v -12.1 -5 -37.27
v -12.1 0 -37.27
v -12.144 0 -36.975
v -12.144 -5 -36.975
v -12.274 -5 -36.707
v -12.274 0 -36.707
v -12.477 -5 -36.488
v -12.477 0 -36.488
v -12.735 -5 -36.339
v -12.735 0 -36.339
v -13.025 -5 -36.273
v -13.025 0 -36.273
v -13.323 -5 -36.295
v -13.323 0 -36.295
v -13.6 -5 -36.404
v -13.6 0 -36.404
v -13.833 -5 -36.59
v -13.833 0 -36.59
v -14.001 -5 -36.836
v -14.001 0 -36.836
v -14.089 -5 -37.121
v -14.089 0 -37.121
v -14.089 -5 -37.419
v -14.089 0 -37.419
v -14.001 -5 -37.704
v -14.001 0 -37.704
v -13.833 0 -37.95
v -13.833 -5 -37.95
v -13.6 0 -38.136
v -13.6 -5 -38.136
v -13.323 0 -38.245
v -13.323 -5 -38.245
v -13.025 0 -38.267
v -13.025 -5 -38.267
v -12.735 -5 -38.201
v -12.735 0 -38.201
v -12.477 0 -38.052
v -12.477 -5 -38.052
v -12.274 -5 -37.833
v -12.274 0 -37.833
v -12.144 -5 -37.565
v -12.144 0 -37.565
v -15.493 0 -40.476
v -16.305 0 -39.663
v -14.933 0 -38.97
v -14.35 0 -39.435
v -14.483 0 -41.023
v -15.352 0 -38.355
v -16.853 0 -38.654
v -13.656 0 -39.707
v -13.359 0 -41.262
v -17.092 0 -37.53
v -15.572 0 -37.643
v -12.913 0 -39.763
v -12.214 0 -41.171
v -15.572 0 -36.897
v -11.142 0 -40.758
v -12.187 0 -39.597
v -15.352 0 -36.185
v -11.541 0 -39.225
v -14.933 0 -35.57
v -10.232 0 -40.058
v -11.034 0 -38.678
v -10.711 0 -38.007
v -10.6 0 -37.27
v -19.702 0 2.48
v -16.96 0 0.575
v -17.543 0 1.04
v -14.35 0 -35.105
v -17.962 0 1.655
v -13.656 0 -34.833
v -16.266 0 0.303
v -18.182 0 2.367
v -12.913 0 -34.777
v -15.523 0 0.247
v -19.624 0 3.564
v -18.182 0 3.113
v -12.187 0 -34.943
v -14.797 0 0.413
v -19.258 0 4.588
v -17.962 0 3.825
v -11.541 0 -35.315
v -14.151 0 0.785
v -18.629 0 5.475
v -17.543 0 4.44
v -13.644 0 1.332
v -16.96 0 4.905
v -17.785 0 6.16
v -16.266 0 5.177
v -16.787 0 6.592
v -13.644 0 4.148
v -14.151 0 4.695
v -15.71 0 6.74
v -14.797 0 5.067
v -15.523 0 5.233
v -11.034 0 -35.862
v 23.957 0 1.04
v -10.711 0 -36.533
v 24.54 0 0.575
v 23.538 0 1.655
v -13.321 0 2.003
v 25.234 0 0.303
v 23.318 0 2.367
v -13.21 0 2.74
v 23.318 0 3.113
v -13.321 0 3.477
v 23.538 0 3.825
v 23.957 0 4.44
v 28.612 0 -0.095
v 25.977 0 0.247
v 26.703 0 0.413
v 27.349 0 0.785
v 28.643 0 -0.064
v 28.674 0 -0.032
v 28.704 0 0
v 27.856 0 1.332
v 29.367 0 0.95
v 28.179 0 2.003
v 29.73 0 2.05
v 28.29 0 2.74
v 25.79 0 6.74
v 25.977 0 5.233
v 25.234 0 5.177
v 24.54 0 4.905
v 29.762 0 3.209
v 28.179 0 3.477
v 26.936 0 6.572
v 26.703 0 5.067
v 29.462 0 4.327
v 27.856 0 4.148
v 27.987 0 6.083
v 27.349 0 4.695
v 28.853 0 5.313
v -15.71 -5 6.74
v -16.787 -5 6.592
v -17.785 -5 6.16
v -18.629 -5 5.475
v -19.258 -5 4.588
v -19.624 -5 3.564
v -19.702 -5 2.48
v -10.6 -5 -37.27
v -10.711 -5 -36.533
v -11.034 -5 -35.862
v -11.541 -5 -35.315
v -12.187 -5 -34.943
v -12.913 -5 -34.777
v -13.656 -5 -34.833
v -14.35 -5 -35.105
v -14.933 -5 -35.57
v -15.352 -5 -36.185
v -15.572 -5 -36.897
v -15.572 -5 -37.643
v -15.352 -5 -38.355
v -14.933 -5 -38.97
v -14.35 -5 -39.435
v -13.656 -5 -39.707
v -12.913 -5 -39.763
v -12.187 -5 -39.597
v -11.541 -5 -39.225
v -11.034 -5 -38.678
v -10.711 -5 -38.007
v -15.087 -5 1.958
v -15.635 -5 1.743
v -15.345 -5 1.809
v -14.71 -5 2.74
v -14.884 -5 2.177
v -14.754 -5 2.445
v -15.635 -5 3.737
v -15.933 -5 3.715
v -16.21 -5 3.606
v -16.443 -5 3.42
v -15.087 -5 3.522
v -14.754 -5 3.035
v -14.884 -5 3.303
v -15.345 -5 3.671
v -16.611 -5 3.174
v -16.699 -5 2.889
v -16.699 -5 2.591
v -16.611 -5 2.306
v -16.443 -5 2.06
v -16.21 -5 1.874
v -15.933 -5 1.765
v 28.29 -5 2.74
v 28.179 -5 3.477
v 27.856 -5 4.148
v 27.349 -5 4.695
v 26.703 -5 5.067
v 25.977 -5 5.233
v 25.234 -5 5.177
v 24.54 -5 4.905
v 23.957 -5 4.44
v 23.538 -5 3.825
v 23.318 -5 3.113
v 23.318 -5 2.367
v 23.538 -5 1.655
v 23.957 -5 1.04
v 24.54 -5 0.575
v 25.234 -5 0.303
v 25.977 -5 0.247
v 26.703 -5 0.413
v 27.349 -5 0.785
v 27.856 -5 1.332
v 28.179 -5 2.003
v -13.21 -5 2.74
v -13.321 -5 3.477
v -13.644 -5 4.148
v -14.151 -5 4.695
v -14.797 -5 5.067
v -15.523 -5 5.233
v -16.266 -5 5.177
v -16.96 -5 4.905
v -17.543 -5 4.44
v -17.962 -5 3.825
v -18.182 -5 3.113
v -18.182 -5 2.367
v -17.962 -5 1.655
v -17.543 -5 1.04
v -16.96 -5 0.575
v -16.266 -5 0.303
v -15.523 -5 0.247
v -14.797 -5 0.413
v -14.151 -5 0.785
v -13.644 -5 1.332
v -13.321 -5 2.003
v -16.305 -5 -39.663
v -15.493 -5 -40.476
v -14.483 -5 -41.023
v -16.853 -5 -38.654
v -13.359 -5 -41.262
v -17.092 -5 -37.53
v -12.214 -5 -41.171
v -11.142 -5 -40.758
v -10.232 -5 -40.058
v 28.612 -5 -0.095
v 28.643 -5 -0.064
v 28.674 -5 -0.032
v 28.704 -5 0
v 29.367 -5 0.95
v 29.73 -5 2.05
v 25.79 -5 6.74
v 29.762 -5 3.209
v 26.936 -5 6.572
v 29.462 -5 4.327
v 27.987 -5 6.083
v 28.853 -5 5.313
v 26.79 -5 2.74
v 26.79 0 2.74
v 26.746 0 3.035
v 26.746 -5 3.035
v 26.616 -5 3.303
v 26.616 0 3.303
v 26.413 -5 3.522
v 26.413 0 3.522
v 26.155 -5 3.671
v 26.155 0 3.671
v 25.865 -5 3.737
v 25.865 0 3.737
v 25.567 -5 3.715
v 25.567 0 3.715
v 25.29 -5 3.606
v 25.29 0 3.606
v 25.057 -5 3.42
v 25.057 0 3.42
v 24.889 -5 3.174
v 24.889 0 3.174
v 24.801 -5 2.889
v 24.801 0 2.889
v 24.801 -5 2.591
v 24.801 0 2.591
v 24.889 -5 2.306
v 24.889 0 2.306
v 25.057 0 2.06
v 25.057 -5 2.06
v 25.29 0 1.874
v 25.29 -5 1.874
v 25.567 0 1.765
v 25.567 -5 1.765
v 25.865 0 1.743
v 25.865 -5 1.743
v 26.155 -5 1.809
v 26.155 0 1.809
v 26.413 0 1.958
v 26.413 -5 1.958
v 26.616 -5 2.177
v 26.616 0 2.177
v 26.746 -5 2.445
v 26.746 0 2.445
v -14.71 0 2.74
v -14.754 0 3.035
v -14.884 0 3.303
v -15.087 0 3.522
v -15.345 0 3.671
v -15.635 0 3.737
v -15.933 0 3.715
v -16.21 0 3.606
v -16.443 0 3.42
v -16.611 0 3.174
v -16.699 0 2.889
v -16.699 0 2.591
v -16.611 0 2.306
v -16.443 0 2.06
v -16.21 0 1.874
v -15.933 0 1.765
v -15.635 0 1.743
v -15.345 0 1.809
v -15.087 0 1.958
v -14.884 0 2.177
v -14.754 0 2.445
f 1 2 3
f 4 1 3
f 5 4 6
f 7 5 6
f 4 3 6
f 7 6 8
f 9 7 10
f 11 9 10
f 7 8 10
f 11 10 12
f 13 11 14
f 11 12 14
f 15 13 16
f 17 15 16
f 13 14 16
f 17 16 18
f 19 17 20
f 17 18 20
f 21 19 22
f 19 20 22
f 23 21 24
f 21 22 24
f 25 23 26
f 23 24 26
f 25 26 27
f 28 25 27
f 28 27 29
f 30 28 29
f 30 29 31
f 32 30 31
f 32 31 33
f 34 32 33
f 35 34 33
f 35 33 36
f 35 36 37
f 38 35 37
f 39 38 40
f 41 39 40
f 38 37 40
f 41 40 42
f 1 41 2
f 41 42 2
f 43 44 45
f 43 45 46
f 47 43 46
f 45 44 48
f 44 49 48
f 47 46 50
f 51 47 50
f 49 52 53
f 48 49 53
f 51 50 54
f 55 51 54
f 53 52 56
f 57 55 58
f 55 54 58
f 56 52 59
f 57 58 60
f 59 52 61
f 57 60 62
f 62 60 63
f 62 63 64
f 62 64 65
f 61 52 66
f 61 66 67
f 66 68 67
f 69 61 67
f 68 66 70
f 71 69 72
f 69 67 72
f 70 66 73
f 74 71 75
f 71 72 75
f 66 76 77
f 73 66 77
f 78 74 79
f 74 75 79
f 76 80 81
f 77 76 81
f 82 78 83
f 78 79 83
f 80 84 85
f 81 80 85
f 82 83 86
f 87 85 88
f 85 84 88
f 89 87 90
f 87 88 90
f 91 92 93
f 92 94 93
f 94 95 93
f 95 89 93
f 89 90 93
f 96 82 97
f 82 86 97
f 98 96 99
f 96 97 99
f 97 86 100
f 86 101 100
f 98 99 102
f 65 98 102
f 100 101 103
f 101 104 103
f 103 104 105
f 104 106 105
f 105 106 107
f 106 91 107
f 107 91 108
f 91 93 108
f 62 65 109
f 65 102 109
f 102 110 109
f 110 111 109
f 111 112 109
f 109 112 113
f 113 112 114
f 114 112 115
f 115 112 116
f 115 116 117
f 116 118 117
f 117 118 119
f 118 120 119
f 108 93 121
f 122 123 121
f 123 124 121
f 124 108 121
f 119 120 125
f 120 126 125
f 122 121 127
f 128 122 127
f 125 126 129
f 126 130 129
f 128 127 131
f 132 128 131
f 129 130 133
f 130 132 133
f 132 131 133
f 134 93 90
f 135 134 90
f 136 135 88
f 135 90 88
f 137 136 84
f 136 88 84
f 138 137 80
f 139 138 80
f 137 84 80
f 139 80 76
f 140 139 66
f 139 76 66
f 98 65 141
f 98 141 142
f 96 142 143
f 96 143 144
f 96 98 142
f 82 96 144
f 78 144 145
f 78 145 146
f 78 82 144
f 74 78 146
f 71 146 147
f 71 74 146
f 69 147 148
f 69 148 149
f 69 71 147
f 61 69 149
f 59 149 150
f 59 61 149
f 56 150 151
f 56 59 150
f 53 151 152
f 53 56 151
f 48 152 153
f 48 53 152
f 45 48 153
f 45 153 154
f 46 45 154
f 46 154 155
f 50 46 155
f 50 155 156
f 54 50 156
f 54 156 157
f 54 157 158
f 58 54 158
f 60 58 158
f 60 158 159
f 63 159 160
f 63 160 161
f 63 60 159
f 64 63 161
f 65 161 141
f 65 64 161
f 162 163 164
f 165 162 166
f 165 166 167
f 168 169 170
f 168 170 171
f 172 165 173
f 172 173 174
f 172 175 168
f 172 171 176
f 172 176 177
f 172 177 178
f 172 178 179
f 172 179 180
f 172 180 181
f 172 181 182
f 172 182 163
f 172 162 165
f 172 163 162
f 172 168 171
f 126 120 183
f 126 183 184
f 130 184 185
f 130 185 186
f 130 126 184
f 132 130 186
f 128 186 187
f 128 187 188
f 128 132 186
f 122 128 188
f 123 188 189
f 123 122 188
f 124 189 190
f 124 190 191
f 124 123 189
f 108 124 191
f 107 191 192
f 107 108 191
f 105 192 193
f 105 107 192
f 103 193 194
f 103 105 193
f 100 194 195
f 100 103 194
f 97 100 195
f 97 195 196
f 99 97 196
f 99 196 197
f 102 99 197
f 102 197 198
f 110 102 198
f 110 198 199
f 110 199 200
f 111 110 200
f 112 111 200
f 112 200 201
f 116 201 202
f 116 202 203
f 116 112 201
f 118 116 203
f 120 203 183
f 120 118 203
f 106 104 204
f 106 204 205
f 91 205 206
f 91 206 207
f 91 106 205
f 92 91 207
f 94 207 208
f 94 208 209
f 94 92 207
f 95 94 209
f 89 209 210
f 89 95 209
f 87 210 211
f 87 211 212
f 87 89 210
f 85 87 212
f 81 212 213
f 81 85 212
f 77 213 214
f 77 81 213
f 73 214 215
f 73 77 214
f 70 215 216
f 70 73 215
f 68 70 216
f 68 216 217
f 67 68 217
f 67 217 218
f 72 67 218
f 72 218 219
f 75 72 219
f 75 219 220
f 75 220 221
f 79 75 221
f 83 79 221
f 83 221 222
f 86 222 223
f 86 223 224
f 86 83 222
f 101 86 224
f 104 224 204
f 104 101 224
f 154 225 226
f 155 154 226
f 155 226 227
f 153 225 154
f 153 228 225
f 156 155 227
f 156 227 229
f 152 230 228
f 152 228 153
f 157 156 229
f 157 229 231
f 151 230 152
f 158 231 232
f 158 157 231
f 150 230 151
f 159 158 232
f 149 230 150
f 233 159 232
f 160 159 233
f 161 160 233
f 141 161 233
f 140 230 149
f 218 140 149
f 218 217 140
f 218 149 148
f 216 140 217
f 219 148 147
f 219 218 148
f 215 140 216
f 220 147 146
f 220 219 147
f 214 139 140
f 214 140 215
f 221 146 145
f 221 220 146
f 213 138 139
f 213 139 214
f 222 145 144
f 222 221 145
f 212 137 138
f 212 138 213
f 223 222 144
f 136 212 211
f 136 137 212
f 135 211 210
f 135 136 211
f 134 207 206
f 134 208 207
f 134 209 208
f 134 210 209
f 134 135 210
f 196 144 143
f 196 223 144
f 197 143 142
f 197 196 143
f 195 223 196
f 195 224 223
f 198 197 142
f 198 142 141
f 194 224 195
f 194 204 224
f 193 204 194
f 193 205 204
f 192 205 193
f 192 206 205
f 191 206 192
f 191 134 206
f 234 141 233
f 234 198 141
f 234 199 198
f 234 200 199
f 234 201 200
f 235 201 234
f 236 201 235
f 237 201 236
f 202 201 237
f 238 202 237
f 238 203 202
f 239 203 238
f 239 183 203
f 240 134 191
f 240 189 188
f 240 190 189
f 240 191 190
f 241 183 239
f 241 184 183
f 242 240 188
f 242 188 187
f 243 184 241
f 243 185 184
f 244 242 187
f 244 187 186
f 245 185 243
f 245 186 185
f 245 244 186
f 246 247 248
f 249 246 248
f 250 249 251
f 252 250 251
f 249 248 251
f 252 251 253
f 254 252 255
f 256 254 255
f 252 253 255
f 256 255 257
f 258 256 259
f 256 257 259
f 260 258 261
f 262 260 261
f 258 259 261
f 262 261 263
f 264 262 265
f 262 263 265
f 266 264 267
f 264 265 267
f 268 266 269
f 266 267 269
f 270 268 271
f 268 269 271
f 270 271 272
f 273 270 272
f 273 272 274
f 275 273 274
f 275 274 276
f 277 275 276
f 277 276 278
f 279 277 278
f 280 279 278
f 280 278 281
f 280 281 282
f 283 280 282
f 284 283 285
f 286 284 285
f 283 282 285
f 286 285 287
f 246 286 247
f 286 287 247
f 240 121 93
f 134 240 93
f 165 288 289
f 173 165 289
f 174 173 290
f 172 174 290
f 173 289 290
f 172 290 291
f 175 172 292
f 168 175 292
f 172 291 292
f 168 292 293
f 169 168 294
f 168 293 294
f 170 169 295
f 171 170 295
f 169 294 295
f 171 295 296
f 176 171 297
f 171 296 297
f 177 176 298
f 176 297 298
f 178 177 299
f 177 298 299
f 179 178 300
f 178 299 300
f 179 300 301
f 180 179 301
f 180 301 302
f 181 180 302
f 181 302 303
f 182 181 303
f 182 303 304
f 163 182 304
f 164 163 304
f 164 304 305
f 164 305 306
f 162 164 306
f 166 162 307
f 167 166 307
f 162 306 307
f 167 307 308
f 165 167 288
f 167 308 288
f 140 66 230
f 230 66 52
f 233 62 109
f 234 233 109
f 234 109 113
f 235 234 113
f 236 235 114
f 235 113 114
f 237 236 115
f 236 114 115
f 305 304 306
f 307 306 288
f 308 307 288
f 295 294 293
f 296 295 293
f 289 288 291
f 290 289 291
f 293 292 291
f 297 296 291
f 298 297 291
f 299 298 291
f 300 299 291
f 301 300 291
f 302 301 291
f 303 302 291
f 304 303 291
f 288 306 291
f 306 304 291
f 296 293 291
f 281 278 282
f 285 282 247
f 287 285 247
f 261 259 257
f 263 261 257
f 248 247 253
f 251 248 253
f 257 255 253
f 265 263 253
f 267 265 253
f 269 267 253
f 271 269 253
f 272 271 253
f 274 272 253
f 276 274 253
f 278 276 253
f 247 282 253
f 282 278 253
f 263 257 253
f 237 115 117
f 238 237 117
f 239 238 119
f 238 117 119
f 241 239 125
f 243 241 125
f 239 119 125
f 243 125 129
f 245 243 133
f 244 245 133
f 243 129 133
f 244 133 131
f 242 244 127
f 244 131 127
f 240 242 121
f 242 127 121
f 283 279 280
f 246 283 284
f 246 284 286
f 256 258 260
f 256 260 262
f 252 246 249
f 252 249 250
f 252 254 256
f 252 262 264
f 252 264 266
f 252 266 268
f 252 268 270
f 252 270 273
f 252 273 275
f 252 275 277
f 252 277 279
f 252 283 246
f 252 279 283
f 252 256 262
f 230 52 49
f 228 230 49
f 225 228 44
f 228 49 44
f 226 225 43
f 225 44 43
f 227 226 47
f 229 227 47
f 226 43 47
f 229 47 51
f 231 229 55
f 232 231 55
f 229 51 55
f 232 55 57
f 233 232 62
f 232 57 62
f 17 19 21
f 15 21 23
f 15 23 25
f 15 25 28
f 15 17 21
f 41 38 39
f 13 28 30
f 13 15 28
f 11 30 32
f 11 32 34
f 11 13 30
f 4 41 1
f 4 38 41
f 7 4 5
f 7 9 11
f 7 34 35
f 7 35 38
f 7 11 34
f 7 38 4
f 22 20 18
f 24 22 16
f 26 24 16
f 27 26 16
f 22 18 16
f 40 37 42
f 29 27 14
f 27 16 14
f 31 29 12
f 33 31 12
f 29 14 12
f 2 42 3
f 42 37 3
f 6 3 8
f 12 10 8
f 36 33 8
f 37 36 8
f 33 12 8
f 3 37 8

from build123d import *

# Parameters (mm, degrees)
F0_R     = 2.5
F0_R_2   = 1
F1_DEPTH = 5


with BuildPart() as f1:
    # F0 (on Front) → F1 (new body)
    with BuildSketch(Plane.XZ):
        with BuildLine():
            Line((25.79, 6.74), (-15.71, 6.74))
            ThreePointArc((-15.71, 6.74), (-18.629035, 5.474819), (-19.701516, 2.479619))
            Line((-19.701516, 2.479619), (-17.091516, -37.530381))
            ThreePointArc((-17.091516, -37.530381), (-14.482956, -41.023323), (-10.231684, -40.057968))
            Line((-10.231684, -40.057968), (28.61167, -0.095168))
            Line((28.61167, -0.095168), (28.704172, 0))
            ThreePointArc((28.704172, 0), (29.461512, 4.327451), (25.79, 6.74))
        make_face()
        with Locations((-13.1, -37.27)):
            Circle(F0_R, mode=Mode.SUBTRACT)
        with Locations((-15.71, 2.74)):
            Circle(F0_R, mode=Mode.SUBTRACT)
        with Locations((25.79, 2.74)):
            Circle(F0_R, mode=Mode.SUBTRACT)
        with BuildLine():
            ThreePointArc((28.61167, -0.095168), (28.658316, -0.047968), (28.704172, 0))
            Line((28.704172, 0), (28.61167, -0.095168))
        make_face()
        with Locations((-15.71, 2.74)):
            Circle(F0_R_2)
        with Locations((-13.1, -37.27)):
            Circle(F0_R_2)
        with Locations((25.79, 2.74)):
            Circle(F0_R_2)
    extrude(amount=F1_DEPTH)


solid = f1.part
